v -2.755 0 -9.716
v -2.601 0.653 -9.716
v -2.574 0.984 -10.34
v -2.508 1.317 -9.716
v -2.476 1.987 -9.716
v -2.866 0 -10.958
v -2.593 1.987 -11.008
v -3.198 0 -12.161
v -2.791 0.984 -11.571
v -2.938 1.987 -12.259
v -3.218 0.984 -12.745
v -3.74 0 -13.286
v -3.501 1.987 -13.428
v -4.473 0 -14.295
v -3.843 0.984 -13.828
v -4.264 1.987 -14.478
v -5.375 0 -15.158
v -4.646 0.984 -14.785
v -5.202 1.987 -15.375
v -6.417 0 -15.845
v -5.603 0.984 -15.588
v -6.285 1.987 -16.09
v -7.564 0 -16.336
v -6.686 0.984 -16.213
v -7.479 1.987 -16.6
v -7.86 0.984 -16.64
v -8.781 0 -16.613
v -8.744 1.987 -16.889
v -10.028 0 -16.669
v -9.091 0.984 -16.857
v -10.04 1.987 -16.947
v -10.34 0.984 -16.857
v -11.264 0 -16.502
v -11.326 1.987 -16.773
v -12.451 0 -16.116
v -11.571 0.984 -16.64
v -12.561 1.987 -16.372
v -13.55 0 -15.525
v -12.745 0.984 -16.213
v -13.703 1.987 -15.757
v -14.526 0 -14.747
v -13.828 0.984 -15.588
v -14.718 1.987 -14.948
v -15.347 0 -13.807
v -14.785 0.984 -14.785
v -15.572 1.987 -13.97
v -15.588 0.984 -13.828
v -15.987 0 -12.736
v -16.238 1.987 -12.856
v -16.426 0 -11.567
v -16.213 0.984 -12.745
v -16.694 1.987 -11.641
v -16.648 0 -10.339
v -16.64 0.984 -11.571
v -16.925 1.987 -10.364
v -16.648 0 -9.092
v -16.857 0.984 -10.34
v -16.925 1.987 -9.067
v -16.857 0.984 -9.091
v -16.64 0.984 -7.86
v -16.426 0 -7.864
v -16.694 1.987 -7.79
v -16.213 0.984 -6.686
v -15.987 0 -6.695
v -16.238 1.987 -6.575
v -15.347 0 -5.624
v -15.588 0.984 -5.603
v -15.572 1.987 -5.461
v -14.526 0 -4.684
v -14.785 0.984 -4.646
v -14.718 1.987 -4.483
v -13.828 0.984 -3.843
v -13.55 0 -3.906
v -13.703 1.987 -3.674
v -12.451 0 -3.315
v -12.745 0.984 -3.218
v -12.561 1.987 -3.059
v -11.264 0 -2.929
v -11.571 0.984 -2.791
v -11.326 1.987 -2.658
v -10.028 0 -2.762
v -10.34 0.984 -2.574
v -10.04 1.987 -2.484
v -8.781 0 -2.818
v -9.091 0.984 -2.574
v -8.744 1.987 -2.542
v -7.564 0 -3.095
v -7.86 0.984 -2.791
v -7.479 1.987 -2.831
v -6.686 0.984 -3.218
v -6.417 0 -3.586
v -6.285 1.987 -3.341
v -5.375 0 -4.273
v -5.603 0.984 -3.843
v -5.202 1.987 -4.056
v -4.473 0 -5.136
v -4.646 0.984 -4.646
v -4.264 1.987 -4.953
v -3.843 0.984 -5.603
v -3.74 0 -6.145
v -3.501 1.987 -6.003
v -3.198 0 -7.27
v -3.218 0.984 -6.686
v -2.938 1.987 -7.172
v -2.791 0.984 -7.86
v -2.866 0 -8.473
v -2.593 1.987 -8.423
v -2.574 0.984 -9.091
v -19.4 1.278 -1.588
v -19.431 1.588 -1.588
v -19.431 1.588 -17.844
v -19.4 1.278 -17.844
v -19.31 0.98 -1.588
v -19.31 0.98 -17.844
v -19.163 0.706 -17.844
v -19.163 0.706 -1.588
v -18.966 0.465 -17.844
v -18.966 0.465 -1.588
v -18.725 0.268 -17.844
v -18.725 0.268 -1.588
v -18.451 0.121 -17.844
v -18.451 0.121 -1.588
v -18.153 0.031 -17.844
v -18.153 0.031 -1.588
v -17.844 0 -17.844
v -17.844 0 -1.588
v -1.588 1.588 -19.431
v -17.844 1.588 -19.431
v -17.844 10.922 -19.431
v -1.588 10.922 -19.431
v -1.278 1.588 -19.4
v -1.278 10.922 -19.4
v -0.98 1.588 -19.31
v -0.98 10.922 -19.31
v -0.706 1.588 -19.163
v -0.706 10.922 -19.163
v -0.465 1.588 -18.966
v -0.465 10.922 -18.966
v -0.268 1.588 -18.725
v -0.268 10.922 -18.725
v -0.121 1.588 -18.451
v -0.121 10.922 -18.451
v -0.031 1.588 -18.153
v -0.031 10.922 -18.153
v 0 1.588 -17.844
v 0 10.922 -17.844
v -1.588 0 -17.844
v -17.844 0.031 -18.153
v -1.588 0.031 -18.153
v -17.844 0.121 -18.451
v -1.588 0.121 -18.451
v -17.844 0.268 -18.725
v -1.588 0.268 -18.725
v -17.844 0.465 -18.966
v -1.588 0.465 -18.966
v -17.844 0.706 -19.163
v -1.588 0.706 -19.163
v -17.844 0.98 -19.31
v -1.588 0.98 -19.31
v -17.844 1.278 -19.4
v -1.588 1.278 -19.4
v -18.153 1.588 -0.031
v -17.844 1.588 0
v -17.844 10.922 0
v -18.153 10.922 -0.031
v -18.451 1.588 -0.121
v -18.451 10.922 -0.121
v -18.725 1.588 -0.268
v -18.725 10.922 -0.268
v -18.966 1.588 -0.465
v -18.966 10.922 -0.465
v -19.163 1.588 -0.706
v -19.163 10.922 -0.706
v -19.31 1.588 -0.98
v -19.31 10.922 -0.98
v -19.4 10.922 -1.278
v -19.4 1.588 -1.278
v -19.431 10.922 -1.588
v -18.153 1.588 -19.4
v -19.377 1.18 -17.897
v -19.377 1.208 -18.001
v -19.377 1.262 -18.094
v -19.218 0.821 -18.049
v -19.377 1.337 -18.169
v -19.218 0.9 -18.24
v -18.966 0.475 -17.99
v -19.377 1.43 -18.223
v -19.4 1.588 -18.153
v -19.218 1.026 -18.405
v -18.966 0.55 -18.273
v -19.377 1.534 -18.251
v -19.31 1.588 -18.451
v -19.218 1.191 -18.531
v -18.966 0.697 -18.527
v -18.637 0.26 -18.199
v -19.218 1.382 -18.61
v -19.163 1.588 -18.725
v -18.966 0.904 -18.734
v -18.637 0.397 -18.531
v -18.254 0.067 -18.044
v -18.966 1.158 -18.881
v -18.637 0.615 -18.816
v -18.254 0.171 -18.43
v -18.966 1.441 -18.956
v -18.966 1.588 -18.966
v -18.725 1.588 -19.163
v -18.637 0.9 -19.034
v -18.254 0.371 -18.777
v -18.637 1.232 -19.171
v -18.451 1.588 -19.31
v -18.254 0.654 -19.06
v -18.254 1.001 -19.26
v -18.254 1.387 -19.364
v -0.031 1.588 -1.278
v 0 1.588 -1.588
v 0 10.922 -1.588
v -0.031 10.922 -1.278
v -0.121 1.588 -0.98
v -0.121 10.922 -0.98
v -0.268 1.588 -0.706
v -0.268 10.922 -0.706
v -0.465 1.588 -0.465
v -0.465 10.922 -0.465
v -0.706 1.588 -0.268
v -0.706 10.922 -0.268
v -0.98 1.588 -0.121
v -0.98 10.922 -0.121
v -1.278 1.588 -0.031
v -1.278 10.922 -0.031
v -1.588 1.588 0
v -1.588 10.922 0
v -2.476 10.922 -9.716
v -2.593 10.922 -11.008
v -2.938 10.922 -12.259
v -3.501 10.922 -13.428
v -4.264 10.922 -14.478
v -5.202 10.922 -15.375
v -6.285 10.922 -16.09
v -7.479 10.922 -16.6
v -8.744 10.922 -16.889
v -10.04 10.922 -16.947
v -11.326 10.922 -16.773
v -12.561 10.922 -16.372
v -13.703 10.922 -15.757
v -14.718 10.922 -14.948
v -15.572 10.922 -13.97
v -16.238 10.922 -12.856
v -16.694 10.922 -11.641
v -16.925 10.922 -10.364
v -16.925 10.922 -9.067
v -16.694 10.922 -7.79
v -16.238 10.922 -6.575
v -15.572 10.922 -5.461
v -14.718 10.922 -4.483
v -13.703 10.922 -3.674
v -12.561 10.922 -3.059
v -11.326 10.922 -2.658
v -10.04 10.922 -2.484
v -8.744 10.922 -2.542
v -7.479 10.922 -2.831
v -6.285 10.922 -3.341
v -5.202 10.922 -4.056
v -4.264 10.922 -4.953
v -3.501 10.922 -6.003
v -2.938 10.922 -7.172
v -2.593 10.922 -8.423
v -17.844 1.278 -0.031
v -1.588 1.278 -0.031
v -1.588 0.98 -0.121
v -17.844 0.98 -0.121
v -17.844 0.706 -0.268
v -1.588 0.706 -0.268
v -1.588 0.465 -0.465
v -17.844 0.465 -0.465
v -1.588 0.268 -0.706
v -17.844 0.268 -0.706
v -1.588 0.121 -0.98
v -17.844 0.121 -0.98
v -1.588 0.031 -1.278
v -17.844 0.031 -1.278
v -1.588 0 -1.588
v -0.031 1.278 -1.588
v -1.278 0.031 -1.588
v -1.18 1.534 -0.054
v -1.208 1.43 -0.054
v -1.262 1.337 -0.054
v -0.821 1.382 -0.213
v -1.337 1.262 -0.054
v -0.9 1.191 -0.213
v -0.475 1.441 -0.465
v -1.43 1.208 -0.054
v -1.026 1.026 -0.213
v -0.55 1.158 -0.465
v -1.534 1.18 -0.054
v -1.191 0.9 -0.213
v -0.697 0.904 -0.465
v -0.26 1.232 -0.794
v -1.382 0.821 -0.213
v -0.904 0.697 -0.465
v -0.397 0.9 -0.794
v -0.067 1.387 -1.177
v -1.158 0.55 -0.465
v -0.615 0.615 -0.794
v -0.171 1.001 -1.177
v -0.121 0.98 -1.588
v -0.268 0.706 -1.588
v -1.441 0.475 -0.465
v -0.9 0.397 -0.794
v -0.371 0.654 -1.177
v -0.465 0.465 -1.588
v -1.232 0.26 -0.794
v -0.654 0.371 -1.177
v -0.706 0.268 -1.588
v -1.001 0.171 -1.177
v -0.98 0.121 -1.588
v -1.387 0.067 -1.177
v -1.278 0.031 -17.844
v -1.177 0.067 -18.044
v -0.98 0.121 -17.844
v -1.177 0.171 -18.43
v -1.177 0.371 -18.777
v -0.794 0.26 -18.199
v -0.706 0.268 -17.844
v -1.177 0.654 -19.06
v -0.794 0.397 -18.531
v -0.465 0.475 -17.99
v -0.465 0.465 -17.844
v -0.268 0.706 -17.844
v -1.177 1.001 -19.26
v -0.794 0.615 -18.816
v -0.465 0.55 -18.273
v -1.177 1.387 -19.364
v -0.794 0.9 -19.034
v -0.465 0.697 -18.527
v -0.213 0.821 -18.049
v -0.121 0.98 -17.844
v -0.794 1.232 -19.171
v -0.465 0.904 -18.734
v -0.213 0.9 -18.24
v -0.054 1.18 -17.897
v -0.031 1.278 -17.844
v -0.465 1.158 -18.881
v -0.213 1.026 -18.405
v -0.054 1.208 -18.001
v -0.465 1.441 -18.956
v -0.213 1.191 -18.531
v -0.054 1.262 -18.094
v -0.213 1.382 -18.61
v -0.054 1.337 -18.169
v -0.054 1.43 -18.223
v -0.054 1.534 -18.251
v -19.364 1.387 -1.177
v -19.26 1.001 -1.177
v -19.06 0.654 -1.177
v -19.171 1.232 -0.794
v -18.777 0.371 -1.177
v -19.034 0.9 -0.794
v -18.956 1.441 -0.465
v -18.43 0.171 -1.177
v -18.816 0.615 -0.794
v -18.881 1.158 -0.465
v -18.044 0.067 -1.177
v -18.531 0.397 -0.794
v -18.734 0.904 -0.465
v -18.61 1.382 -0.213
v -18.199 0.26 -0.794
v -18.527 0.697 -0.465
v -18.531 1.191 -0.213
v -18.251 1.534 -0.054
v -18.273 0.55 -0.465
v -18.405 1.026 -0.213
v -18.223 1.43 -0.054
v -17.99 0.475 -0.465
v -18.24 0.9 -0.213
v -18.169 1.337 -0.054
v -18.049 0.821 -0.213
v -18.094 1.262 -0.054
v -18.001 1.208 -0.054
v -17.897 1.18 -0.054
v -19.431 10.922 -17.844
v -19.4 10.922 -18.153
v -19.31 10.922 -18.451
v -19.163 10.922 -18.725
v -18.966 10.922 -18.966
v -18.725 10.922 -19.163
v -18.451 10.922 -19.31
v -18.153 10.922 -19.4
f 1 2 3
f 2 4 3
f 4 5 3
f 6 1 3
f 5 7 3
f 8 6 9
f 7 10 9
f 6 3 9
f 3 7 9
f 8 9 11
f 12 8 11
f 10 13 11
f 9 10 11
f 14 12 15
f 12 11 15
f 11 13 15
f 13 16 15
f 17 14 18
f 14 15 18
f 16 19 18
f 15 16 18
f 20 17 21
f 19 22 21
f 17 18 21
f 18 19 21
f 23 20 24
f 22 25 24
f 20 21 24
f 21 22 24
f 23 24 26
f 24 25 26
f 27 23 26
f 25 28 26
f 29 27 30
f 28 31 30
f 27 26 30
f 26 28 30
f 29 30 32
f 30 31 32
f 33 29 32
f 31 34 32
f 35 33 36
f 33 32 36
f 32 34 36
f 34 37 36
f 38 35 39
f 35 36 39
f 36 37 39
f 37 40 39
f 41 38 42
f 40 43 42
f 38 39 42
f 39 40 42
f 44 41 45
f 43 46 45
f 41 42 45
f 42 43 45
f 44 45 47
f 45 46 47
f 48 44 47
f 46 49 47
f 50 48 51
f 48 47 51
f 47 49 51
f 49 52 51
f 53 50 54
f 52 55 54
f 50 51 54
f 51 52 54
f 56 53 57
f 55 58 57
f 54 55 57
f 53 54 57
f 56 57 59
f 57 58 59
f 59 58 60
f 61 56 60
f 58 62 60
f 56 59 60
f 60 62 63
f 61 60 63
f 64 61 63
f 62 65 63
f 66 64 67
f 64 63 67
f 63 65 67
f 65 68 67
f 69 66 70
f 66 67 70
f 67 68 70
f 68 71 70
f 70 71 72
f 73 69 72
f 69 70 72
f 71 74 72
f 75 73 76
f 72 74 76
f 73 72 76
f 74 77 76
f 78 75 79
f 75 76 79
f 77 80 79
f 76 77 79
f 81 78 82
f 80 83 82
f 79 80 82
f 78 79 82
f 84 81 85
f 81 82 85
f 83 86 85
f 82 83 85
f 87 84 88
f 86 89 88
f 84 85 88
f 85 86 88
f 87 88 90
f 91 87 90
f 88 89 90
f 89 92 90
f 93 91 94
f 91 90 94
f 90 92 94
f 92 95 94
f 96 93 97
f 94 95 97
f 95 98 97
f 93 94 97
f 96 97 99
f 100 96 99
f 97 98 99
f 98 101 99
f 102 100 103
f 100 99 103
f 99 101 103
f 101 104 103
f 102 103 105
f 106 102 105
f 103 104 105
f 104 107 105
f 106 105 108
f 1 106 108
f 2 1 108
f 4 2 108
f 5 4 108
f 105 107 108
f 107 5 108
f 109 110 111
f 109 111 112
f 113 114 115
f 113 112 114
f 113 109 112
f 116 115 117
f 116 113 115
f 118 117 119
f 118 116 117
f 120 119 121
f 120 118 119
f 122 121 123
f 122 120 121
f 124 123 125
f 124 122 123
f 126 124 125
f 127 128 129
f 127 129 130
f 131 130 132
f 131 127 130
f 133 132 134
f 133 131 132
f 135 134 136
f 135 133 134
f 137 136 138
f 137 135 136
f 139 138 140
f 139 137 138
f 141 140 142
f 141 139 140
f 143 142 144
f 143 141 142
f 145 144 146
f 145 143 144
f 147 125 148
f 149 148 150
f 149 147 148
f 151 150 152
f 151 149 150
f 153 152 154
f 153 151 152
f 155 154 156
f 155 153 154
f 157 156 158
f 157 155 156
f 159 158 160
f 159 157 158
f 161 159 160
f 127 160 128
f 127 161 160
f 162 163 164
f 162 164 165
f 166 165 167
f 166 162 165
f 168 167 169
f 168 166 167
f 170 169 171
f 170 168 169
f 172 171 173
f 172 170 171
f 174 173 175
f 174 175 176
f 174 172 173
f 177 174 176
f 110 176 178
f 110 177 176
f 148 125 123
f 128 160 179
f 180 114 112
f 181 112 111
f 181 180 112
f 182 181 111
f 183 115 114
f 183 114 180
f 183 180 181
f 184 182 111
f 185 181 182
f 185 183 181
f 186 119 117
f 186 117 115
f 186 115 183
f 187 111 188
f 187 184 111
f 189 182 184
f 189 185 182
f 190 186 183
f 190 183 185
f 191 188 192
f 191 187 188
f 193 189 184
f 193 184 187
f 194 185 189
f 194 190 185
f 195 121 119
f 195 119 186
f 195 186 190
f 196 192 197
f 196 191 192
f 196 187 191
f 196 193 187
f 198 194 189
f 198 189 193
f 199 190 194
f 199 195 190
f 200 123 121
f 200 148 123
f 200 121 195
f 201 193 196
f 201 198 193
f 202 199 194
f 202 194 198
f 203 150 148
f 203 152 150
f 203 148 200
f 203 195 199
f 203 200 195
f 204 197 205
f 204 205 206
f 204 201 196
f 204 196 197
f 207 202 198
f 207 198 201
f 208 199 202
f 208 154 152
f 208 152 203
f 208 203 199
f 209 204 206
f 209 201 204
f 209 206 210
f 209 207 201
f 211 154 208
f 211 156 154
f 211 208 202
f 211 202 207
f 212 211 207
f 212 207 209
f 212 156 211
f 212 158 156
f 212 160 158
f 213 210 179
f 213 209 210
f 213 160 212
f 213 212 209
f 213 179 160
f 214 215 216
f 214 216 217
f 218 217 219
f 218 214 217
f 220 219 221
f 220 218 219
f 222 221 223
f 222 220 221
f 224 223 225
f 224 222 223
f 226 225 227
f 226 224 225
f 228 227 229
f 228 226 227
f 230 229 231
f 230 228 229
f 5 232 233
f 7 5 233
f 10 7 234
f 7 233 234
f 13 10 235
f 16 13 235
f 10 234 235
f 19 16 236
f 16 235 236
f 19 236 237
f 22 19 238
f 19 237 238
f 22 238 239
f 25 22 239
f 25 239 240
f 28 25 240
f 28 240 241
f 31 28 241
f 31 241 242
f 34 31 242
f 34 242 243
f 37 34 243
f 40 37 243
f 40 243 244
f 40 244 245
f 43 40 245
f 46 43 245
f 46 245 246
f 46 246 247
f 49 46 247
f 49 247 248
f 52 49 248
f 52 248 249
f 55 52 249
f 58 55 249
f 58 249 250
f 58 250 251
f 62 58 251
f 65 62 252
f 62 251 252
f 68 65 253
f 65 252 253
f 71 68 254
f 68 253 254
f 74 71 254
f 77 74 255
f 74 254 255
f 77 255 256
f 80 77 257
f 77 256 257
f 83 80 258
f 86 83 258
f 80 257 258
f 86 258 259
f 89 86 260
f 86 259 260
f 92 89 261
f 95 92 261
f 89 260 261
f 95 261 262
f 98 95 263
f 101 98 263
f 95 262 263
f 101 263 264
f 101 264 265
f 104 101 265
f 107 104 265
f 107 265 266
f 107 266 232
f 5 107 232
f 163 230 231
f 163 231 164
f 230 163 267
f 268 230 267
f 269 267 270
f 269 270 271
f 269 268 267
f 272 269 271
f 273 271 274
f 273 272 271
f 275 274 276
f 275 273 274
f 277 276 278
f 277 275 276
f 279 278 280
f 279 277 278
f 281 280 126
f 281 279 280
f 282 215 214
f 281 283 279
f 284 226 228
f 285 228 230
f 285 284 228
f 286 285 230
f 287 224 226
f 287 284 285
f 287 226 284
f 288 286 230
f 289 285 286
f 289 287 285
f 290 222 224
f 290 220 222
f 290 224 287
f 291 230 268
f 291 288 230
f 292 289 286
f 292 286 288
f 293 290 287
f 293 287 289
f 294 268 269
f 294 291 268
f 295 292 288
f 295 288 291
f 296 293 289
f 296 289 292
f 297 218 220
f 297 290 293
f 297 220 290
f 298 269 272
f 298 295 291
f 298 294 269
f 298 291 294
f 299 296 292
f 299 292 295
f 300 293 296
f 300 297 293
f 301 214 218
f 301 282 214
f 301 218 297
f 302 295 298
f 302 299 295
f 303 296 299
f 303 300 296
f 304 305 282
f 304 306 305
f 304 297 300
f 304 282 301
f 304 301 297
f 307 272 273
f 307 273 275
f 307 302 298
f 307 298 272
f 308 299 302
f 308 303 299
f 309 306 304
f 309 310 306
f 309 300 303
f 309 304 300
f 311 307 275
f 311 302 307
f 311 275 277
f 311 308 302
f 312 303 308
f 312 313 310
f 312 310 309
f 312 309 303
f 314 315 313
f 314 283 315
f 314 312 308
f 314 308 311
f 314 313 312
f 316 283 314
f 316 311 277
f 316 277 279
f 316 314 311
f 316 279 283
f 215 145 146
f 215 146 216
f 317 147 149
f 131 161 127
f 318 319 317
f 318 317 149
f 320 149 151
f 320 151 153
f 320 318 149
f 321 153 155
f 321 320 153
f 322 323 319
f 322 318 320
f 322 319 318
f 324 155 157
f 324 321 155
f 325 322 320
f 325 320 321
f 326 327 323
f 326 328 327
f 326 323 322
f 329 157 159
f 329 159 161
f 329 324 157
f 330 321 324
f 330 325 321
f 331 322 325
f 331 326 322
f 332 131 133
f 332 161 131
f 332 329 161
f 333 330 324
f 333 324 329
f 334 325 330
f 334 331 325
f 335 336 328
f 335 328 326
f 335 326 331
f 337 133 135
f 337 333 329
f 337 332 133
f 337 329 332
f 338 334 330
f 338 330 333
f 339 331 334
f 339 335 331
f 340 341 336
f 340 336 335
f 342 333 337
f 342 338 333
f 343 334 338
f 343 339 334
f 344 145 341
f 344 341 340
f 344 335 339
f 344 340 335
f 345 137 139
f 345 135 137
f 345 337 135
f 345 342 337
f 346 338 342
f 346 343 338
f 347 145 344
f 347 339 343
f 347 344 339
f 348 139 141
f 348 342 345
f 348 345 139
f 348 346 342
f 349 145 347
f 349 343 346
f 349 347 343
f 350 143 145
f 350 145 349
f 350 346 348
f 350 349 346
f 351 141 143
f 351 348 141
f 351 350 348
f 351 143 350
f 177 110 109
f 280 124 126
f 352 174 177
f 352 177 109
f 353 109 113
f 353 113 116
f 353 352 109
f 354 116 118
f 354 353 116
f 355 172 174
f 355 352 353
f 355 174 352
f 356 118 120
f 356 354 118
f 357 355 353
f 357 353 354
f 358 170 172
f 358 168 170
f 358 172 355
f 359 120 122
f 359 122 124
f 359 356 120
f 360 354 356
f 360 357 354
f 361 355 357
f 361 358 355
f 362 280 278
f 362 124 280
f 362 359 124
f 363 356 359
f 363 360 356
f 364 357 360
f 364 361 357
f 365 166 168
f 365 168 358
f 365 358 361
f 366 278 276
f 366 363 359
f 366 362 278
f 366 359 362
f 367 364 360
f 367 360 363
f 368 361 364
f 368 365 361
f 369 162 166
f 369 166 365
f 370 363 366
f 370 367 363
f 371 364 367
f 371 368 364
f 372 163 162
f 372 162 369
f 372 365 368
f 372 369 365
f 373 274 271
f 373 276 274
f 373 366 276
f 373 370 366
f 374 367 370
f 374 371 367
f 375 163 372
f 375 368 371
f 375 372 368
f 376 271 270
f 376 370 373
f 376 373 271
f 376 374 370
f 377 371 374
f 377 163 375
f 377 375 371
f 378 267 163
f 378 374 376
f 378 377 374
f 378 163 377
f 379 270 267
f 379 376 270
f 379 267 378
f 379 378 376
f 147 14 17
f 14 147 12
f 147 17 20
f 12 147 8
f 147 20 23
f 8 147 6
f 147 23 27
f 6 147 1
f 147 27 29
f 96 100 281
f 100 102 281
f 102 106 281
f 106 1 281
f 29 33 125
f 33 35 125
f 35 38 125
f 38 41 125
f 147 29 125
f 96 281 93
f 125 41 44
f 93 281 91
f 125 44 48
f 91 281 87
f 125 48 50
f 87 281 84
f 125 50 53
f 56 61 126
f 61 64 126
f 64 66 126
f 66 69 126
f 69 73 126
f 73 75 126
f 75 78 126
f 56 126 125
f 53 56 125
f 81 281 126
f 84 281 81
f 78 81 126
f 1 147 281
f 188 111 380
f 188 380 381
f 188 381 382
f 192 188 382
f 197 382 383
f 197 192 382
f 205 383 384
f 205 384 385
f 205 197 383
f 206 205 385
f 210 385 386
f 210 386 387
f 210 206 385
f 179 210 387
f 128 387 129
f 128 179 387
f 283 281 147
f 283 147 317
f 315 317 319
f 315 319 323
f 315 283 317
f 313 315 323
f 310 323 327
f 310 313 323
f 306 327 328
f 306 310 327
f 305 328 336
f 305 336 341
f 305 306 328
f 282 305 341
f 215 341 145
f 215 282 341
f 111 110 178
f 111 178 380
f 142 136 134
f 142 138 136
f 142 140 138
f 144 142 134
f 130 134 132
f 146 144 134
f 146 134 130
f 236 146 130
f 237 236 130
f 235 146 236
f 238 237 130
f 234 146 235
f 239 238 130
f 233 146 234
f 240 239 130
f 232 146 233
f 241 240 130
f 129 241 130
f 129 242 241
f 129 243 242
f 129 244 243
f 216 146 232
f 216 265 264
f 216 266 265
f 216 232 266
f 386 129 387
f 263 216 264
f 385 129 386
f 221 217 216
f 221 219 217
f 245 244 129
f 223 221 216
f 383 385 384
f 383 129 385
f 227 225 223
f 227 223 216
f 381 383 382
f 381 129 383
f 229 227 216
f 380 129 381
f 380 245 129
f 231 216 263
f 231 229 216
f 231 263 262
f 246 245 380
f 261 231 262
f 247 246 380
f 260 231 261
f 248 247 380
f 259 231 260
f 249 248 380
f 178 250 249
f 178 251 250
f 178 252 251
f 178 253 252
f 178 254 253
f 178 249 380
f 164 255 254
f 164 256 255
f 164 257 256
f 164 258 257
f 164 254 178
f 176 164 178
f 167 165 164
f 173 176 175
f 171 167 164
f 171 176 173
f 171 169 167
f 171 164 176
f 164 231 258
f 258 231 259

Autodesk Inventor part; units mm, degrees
ref_plane "YZ Plane" through (0, 0, 0) normal (1, 0, 0) x (0, 1, 0)
ref_plane "XZ Plane" through (0, 0, 0) normal (0, 1, 0) x (-1, 0, 0)
sketch "Sketch1" plane through (0, 0, 0) normal (0, 1, 0) x (-1, 0, 0)
  line L0 (0, 0) -> (19.431, 0)
  line L1 (19.431, 0) -> (19.431, -19.431)
  line L2 (19.431, -19.431) -> (0, -19.431)
  line L3 (0, -19.431) -> (0, 0)
  dimension "d0" = 19.431
  dimension "d1" = 19.431
extrude "Extrusion1" add sketch "Sketch1" along normal blind 10.922
ref_plane "Work Plane2" through (-19.431, 0, -9.7155) normal (0, 0, 1) x (1, 0, 0)
sketch "Sketch2" plane through (-19.431, 0, -9.7155) normal (0, 0, 1) x (1, 0, 0)
  arc A0 (9.7155, -5.2517) -> (16.9545, 1.9873) centre (9.7155, 1.9873) ccw
  line L0 (16.9545, 1.9873) -> (16.9545, 10.922)
  line L1 (19.431, 10.922) -> (0, 10.922) projected
  line L2 (9.7155, -5.3792) -> (9.7155, 10.922)
  line L3 (16.9545, 10.922) -> (9.7155, 10.922)
  point P0 (19.431, 0)
  dimension "d4" = 14.478
revolve "Revolution1" cut sketch "Sketch2" angle 360 about axis through (-9.7155, -5.3792, -9.7155) along (0, 1, 0)
fillet "Fillet1" radius 1.5875 2 edges at (-9.7155, 0, -19.431) (0, 0, -9.7155)
fillet "Fillet2" radius 1.5875 9 edges at (-19.431, 0, -8.9218) (-19.431, 0.465, -18.966) (-19.431, 6.2548, -19.431) (-0.465, 0.465, 0) (0, 6.2548, 0) (-10.5092, 0, 0) (-0.465, 0.465, -18.966) (0, 6.2548, -19.431) (-19.431, 5.461, 0)
equation "\"d1\" = d0"
properties part number "tail-rolley-polley"
